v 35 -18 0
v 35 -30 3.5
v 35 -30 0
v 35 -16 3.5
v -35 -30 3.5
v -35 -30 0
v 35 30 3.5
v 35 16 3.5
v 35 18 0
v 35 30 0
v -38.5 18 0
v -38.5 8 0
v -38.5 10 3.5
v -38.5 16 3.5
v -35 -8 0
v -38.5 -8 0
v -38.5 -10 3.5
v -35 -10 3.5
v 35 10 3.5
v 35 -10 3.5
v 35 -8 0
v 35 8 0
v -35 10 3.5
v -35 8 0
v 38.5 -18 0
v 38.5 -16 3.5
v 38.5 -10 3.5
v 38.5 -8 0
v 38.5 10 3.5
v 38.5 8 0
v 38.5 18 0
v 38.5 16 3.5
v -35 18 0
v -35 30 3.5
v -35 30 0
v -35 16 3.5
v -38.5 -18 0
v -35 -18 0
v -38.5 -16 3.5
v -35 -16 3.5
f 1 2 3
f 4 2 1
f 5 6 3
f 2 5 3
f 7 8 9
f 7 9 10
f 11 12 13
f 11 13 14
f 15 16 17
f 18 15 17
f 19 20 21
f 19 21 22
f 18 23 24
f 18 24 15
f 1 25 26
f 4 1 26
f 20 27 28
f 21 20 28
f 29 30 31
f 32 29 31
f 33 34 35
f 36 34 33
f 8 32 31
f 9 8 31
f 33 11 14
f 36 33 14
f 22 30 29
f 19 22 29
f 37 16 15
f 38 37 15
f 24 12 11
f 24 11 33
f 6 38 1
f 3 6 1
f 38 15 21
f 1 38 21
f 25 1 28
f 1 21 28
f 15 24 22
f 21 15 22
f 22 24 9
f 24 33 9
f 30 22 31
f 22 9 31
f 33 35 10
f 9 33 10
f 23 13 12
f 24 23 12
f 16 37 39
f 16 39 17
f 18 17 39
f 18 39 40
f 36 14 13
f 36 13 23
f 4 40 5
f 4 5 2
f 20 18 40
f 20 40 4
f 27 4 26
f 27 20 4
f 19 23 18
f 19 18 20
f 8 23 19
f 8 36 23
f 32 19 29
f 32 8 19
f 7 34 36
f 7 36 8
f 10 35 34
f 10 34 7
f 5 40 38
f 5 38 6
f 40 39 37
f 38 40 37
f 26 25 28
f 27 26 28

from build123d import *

# Parameters (mm, degrees)
F0_W     = 77
F0_H     = 60
F1_DEPTH = 3.5
F3_DEPTH = 3.5
F5_DEPTH = 3.5


with BuildPart() as f1:
    # F0 (on Top) → F1 (new body)
    with BuildSketch(Plane.XY):
        Rectangle(F0_W, F0_H)
    extrude(amount=F1_DEPTH)

    # F2 (on face) → F3 (cut)
    with BuildSketch(Plane(origin=(-38.5, 0, 0), x_dir=(0, -1, 0), z_dir=(-1, 0, 0))):
        Polygon((-16, 3.5), (-30, 3.5), (-30, 0), (-18, 0), align=None)
        Polygon((10, 3.5), (-10, 3.5), (-8, 0), (8, 0), align=None)
        Polygon((30, 3.5), (16, 3.5), (18, 0), (30, 0), align=None)
    extrude(amount=-F3_DEPTH, mode=Mode.SUBTRACT)

    # F4 (on face) → F5 (cut)
    with BuildSketch(Plane.YZ.offset(38.5)):
        Polygon((-18, 0), (-16, 3.5), (-30, 3.5), (-30, 0), align=None)
        Polygon((8, 0), (10, 3.5), (-10, 3.5), (-8, 0), align=None)
        Polygon((30, 0), (30, 3.5), (16, 3.5), (18, 0), align=None)
    extrude(amount=-F5_DEPTH, mode=Mode.SUBTRACT)


solid = f1.part
